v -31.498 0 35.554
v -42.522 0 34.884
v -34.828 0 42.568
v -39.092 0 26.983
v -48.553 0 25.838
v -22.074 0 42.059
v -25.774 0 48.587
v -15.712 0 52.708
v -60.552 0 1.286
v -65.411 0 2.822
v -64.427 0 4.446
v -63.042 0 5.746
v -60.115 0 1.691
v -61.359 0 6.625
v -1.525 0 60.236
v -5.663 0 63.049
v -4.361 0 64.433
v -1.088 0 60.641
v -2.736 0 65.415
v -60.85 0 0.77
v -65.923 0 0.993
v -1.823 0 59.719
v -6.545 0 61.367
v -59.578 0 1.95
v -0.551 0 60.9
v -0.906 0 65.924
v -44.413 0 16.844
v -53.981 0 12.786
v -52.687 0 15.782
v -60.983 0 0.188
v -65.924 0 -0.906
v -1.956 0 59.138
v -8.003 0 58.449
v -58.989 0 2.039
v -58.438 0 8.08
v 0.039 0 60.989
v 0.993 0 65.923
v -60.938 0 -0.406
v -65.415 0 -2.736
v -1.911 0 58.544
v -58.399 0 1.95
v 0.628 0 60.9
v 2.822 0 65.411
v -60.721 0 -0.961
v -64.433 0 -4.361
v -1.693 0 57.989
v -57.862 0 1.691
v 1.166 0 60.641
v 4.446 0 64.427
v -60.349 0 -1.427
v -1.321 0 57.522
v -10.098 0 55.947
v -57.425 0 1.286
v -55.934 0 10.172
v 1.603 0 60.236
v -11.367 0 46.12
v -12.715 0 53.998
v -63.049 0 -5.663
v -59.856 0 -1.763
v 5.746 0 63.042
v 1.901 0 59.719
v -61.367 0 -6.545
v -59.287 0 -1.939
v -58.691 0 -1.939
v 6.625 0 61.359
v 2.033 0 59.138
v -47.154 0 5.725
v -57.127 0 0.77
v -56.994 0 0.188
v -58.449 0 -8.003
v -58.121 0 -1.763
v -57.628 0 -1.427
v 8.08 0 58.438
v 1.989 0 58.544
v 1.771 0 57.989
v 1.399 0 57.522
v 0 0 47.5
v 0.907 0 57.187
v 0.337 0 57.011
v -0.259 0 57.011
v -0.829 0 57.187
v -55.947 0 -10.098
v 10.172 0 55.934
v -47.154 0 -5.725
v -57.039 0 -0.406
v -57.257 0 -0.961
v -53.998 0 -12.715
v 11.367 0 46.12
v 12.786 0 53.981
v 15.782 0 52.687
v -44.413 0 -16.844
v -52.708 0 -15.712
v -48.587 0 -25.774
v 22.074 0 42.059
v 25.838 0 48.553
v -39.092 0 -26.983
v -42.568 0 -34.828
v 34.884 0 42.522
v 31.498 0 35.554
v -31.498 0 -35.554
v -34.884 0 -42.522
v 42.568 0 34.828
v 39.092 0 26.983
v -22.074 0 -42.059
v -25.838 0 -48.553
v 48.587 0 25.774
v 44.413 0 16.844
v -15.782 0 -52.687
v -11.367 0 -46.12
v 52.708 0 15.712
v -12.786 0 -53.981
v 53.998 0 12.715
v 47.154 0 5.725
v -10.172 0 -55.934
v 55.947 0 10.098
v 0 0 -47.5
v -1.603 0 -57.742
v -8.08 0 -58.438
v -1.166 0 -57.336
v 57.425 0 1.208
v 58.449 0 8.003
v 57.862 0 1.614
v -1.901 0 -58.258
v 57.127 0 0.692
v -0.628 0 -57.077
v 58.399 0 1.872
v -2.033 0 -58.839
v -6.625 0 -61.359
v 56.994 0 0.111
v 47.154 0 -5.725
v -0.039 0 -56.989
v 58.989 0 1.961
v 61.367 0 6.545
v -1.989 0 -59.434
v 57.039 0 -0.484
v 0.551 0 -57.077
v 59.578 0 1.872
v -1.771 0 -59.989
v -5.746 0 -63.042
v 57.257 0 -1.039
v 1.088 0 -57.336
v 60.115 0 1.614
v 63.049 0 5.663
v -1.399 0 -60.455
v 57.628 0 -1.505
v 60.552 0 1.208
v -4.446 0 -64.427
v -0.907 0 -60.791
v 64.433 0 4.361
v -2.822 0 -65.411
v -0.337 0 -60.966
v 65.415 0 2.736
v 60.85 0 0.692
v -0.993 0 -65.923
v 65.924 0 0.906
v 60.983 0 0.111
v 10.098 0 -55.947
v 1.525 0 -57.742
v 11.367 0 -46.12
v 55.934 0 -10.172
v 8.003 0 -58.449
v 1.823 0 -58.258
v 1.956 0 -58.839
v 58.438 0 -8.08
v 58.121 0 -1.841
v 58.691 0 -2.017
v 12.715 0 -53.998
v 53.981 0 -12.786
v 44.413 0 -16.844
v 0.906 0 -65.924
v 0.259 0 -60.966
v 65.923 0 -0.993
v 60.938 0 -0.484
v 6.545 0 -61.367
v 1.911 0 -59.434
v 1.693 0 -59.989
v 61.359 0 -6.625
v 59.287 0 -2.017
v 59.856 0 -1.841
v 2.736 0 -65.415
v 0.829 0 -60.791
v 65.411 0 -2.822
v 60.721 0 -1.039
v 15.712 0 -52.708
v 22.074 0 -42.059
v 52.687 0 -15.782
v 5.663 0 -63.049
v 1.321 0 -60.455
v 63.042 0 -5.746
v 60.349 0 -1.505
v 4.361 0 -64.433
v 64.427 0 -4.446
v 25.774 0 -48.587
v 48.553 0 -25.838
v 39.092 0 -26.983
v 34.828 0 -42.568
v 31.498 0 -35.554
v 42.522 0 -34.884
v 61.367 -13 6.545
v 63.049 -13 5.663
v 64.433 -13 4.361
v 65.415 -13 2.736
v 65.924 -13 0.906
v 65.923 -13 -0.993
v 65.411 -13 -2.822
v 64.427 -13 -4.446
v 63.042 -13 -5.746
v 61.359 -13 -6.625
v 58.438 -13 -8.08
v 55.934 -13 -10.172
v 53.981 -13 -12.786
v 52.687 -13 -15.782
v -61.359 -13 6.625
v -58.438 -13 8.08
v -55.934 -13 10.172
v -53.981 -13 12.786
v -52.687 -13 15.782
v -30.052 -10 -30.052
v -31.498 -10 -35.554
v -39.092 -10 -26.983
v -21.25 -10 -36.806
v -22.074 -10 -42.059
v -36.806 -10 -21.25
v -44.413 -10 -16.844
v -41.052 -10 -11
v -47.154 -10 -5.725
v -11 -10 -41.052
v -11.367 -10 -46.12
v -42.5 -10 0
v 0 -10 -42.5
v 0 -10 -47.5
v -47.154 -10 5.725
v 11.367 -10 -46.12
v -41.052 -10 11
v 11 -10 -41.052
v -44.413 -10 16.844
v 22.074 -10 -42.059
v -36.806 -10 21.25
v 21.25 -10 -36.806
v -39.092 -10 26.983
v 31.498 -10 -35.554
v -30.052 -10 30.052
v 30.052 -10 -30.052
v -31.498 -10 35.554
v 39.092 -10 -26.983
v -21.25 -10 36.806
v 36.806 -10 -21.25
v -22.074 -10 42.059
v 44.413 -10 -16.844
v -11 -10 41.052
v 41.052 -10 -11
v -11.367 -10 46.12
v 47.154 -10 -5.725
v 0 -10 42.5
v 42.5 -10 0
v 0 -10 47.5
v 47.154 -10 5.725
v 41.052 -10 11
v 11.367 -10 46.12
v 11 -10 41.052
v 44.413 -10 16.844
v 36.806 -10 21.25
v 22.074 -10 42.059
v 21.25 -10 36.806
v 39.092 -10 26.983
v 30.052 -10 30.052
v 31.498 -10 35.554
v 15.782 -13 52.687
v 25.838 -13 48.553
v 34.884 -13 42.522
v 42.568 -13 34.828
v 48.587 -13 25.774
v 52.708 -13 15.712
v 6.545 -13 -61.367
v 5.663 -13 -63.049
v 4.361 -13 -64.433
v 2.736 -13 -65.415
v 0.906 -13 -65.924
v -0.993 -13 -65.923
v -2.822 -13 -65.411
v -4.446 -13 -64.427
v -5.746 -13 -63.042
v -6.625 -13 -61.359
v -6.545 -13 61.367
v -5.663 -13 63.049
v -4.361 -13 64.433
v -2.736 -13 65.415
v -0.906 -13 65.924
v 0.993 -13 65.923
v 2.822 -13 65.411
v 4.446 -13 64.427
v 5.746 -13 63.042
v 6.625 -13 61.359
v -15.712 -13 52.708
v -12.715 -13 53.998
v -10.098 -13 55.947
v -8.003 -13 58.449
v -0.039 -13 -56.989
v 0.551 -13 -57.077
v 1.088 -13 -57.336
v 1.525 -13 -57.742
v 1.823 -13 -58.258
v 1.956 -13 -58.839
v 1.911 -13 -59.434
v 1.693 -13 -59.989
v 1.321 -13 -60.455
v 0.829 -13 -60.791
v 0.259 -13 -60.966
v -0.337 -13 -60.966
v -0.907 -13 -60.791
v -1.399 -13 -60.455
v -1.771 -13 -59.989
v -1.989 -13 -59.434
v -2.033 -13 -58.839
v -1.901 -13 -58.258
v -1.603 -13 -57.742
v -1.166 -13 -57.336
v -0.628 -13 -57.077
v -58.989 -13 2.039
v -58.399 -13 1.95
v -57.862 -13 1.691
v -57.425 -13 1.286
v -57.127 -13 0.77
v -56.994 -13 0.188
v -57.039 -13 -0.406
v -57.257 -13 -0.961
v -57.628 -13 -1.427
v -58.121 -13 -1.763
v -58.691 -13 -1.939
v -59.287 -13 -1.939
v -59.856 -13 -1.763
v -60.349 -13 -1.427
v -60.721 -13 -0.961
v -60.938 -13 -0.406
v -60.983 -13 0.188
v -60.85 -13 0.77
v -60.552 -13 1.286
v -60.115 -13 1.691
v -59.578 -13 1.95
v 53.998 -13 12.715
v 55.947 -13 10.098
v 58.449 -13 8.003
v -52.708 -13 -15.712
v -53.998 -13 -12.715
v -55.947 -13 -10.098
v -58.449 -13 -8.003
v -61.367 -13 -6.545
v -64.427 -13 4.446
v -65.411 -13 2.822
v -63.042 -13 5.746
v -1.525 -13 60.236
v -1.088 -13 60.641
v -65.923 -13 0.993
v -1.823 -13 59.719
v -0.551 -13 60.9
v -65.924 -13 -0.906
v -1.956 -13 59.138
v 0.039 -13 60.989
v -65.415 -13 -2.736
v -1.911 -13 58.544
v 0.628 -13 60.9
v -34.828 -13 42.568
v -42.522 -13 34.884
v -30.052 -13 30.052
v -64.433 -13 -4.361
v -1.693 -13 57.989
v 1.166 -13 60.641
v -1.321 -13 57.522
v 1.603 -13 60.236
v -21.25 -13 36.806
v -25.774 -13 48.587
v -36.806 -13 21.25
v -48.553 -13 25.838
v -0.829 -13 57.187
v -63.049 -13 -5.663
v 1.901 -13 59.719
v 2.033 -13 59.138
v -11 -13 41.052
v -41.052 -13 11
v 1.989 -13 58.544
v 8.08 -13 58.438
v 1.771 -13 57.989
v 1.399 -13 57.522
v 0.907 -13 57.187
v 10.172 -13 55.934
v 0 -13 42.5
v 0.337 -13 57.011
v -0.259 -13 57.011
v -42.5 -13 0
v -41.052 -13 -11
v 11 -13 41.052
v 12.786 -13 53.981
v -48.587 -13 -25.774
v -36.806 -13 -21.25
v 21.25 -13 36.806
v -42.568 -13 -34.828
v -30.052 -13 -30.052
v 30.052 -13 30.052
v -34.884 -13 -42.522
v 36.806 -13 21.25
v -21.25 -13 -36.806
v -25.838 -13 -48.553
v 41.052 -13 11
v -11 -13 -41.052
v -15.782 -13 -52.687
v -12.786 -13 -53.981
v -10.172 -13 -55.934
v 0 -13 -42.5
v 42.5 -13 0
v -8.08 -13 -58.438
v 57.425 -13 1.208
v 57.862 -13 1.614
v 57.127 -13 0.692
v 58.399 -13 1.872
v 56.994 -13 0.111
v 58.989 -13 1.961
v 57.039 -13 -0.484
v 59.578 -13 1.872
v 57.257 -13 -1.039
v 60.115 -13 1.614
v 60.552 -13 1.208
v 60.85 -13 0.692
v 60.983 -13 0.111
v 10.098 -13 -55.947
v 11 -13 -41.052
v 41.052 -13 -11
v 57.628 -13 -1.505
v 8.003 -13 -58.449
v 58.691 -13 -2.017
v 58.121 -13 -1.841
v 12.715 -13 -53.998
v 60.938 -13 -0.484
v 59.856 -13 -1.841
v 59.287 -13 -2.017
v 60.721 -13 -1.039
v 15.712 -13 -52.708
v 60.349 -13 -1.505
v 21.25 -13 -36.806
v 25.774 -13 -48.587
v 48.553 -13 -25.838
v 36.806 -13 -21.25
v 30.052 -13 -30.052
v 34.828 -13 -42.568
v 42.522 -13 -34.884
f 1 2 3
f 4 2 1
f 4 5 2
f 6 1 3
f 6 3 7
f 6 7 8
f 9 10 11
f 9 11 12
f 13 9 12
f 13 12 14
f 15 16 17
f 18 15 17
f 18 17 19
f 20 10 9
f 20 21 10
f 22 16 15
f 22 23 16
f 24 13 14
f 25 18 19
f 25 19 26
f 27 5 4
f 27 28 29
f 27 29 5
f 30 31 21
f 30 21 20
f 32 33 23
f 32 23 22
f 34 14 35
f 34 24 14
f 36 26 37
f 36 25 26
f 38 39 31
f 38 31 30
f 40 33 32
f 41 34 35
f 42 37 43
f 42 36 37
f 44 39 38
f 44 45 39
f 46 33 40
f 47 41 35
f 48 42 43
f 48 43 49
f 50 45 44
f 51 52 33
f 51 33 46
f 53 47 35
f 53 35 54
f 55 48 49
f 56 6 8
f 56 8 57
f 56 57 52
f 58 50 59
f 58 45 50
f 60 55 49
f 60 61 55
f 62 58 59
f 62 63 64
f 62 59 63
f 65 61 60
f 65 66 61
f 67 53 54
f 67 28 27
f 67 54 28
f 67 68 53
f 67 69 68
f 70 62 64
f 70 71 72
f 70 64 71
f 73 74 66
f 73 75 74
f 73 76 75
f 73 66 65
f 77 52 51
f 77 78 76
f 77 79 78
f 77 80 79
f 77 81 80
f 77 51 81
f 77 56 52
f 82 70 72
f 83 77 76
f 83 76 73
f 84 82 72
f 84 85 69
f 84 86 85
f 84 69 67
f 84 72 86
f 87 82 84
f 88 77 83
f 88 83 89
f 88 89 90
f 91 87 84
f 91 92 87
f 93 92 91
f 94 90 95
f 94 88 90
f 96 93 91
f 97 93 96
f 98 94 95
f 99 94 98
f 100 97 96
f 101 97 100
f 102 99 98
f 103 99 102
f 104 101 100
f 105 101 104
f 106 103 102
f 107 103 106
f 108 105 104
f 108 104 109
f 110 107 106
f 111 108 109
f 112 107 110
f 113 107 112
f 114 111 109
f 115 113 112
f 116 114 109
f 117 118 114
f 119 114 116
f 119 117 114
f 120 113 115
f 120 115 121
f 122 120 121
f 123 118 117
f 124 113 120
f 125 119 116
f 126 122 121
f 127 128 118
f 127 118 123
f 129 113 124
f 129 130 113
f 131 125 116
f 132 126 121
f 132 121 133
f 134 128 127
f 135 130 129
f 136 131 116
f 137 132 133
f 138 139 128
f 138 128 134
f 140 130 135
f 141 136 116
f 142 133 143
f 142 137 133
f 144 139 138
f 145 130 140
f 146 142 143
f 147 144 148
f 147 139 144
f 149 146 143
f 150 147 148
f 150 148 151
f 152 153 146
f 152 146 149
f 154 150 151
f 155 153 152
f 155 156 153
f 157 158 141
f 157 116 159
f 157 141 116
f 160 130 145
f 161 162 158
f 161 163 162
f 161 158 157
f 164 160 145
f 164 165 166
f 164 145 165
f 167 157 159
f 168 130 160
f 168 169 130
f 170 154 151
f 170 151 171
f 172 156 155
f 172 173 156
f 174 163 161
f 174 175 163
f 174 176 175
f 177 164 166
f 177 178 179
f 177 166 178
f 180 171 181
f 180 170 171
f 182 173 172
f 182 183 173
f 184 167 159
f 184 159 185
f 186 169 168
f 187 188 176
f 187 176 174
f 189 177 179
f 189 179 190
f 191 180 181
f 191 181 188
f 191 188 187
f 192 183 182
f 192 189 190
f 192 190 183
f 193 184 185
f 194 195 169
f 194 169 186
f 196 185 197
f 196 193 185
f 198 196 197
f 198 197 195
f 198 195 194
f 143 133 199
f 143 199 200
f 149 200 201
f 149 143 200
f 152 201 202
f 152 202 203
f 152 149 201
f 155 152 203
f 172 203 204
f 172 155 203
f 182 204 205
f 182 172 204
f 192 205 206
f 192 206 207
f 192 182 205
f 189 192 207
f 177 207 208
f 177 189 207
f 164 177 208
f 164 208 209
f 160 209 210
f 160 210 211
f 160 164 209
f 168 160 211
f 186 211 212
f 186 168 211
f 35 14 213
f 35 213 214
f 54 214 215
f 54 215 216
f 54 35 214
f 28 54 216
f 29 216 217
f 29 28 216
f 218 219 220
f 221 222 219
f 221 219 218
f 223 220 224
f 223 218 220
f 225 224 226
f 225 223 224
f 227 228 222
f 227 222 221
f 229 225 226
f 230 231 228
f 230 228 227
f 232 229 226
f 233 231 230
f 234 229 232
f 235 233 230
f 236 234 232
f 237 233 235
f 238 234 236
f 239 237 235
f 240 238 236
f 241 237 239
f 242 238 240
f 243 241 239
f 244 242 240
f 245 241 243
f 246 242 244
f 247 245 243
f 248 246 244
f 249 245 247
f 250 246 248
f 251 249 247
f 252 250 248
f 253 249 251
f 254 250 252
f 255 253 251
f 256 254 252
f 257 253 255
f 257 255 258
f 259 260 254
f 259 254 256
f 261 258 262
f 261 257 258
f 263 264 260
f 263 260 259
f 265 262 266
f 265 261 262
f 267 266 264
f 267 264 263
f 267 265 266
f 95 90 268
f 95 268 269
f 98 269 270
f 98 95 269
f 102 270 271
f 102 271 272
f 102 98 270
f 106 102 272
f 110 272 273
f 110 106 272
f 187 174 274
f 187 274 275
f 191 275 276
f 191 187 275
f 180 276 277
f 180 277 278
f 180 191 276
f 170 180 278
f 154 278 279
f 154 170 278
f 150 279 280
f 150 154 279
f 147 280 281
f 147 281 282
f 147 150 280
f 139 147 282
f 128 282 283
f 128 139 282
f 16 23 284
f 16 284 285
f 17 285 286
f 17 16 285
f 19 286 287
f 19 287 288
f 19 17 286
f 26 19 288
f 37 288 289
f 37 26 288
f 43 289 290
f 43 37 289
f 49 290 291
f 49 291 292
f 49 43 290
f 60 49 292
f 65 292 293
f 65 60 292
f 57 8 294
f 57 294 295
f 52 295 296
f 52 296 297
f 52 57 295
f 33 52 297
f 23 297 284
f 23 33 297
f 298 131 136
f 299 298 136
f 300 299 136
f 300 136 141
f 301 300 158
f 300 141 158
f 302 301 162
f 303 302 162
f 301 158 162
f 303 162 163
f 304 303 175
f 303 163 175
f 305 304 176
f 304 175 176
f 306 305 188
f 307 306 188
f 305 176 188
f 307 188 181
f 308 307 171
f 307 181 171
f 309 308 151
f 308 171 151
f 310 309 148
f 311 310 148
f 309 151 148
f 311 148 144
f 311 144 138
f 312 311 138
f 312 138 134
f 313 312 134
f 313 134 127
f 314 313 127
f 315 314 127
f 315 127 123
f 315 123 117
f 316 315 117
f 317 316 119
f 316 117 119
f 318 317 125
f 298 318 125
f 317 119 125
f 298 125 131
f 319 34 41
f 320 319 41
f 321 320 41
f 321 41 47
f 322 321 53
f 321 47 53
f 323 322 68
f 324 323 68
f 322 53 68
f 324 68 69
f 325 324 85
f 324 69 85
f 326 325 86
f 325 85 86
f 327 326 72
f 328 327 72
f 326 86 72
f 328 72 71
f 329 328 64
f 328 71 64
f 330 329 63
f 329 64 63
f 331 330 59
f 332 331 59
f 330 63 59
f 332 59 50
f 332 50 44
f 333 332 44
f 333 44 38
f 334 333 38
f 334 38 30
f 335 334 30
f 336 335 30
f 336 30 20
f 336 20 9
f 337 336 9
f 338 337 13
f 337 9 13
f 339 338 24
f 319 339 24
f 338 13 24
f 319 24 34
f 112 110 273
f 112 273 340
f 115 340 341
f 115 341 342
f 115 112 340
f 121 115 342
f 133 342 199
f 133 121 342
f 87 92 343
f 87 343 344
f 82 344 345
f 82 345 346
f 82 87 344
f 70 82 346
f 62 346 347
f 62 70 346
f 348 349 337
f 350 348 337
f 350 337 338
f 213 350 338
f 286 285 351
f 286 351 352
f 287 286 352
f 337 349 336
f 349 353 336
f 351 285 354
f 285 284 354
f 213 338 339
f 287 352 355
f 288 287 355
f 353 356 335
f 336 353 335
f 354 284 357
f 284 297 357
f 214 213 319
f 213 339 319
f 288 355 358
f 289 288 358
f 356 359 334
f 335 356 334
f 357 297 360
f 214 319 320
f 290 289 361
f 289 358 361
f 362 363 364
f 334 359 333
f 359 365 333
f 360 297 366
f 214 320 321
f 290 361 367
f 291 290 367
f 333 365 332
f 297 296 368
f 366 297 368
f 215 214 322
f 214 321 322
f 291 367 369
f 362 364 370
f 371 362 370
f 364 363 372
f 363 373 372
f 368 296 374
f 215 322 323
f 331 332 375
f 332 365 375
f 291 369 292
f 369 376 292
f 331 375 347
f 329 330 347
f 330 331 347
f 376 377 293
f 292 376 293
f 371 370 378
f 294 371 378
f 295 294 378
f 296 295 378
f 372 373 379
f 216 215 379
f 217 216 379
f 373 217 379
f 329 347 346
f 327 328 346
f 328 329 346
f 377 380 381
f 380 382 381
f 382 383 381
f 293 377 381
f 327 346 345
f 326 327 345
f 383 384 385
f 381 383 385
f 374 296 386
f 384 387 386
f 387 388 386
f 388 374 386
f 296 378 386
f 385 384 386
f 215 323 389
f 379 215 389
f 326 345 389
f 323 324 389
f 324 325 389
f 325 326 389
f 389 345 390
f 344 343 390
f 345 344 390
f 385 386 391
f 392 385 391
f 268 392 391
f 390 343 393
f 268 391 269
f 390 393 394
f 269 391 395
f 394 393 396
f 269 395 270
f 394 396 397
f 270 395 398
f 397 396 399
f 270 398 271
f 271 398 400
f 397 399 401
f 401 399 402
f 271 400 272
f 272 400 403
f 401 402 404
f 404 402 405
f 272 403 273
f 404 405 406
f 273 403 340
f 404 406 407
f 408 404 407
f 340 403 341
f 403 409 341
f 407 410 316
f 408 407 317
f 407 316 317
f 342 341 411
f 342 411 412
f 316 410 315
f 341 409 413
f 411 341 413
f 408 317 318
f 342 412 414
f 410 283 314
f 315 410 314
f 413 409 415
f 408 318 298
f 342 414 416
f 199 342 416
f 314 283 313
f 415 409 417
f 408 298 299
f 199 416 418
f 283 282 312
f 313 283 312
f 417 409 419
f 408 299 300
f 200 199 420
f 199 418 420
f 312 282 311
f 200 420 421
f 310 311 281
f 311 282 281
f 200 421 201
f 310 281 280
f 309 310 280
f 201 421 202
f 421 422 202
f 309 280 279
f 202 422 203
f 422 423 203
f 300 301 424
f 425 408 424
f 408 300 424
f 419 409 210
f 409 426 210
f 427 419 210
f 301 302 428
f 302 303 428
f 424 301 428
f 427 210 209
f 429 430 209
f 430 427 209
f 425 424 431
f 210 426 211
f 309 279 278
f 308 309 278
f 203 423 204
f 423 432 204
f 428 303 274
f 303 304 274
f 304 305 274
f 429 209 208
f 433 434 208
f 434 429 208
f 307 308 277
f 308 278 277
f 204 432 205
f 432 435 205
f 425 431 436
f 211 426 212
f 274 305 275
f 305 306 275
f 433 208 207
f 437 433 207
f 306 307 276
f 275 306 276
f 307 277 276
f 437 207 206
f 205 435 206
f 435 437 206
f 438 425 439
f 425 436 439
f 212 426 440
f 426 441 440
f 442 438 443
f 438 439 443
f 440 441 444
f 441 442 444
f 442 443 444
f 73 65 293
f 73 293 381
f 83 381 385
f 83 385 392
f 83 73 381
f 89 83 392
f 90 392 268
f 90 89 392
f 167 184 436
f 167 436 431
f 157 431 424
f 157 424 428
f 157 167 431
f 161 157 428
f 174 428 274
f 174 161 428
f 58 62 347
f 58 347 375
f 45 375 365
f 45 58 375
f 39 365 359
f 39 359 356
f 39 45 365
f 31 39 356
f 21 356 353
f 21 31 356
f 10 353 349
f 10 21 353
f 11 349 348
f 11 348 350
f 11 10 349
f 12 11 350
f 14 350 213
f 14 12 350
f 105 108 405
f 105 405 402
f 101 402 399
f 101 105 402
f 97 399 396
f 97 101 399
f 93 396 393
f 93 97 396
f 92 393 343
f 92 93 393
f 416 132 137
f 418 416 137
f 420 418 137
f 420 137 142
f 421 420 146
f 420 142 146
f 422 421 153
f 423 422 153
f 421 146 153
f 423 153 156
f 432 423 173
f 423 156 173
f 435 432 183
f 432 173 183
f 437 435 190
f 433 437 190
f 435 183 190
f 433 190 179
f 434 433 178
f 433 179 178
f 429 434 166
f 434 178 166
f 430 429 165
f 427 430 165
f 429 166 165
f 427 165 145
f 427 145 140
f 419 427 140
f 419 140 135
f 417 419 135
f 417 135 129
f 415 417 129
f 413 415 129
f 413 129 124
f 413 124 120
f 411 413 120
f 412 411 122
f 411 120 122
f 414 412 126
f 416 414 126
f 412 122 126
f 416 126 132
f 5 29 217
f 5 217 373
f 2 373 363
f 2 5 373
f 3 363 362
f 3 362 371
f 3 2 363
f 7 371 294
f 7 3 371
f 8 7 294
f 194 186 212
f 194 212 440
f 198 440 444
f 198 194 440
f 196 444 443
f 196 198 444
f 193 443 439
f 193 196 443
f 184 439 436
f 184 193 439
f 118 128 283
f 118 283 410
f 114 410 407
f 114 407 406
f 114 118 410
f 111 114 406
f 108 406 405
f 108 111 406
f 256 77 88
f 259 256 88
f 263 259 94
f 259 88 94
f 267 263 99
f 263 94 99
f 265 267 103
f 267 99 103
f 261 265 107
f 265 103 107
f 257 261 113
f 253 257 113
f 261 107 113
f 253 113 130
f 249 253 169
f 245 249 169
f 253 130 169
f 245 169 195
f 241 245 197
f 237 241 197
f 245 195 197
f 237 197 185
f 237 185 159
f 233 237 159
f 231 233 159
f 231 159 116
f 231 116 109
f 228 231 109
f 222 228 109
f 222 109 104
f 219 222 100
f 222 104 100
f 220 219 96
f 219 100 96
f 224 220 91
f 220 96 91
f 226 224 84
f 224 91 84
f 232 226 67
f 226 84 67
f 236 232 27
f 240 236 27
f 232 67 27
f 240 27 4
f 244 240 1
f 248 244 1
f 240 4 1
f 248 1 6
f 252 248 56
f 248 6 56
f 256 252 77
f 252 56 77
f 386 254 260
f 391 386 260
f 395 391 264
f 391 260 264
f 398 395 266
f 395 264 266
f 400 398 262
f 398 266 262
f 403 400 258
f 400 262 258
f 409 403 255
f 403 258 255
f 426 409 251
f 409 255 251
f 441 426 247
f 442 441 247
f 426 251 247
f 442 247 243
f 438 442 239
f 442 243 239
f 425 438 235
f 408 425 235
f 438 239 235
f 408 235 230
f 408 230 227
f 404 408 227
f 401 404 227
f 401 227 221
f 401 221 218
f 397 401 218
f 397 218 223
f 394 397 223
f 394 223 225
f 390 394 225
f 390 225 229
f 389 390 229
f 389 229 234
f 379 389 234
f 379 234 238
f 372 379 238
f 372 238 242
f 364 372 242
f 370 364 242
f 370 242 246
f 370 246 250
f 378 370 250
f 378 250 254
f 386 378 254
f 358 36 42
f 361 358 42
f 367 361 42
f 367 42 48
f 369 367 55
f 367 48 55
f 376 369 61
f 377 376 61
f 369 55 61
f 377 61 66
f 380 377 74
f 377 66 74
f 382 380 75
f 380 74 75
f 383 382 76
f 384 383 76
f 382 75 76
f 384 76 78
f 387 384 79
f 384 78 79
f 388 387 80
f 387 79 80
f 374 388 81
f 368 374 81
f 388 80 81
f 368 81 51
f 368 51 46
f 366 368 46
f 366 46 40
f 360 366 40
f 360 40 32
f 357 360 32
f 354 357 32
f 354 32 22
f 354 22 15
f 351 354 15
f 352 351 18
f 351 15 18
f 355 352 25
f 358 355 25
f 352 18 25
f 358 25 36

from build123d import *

# Parameters (mm, degrees)
SKETCH1_R           = 2
BOSS_EXTRUDE1_DEPTH = 13
SKETCH2_R           = 47.5
CUT_EXTRUDE1_DEPTH  = 10
SKETCH3_R           = 42.5
CUT_EXTRUDE2_DEPTH  = 10


with BuildPart() as part:
    # Sketch1 → Boss-Extrude1 (new body)
    # profile 1 of 4: a face of its own
    with BuildSketch(Plane(origin=(0, 0, 0), x_dir=(1, 0, 0), z_dir=(0, 1, 0))):
        with BuildLine():
            ThreePointArc((61.367242208, -6.544599037), (65.988588721, 0.043478359), (61.35856476, 6.625460242))
            ThreePointArc((61.35856476, 6.625460242), (55.933608349, 10.171878458), (52.687221143, 15.781531238))
            ThreePointArc((52.687221143, 15.781531238), (-54.999988062, -0.036238224), (52.707971563, -15.712088776))
            ThreePointArc((52.707971563, -15.712088776), (55.946963812, -10.098162928), (61.367242208, -6.544599037))
        make_face()
        with Locations(Location((58.98859024, 0.038866222, 0), (0, 0, 270))):
            Circle(SKETCH1_R, mode=Mode.SUBTRACT)
    # profile 2 of 4: a face of its own
    with BuildSketch(Plane(origin=(0, 0, 0), x_dir=(1, 0, 0), z_dir=(0, 1, 0))):
        with BuildLine():
            ThreePointArc((6.625460242, -61.35856476), (10.171878458, -55.933608349), (15.781531238, -52.687221143))
            ThreePointArc((15.781531238, -52.687221143), (0.036238224, -54.999988062), (-15.712088776, -52.707971563))
            ThreePointArc((-15.712088776, -52.707971563), (-10.098162928, -55.946963812), (-6.544599037, -61.367242208))
            ThreePointArc((-6.544599037, -61.367242208), (0.043478359, -65.988588721), (6.625460242, -61.35856476))
        make_face()
        with Locations(Location((0.038866222, -58.98859024, 0), (0, 0, 270))):
            Circle(SKETCH1_R, mode=Mode.SUBTRACT)
    # profile 3 of 4: a face of its own
    with BuildSketch(Plane(origin=(0, 0, 0), x_dir=(1, 0, 0), z_dir=(0, 1, 0))):
        with BuildLine():
            ThreePointArc((-52.687221143, -15.781531238), (-54.999988062, -0.036238224), (-52.707971563, 15.712088776))
            ThreePointArc((-52.707971563, 15.712088776), (-55.946963812, 10.098162928), (-61.367242208, 6.544599037))
            ThreePointArc((-61.367242208, 6.544599037), (-65.988588721, -0.043478359), (-61.35856476, -6.625460242))
            ThreePointArc((-61.35856476, -6.625460242), (-55.933608349, -10.171878458), (-52.687221143, -15.781531238))
        make_face()
        with Locations(Location((-58.98859024, -0.038866222, 0), (0, 0, 270))):
            Circle(SKETCH1_R, mode=Mode.SUBTRACT)
    # profile 4 of 4: a face of its own
    with BuildSketch(Plane(origin=(0, 0, 0), x_dir=(1, 0, 0), z_dir=(0, 1, 0))):
        with BuildLine():
            ThreePointArc((-15.781531238, 52.687221143), (-0.036238224, 54.999988062), (15.712088776, 52.707971563))
            ThreePointArc((15.712088776, 52.707971563), (10.098162928, 55.946963812), (6.544599037, 61.367242208))
            ThreePointArc((6.544599037, 61.367242208), (-0.043478359, 65.988588721), (-6.625460242, 61.35856476))
            ThreePointArc((-6.625460242, 61.35856476), (-10.171878458, 55.933608349), (-15.781531238, 52.687221143))
        make_face()
        with Locations(Location((-0.038866222, 58.98859024, 0), (0, 0, 270))):
            Circle(SKETCH1_R, mode=Mode.SUBTRACT)
    extrude(amount=-BOSS_EXTRUDE1_DEPTH)

    # Sketch2 → Cut-Extrude1 (cut)
    with BuildSketch(Plane(origin=(0, 0, 0), x_dir=(1, 0, 0), z_dir=(0, 1, 0))):
        with Locations(Location((0, 0, 0), (0, 0, 270))):
            Circle(SKETCH2_R)
    extrude(amount=-CUT_EXTRUDE1_DEPTH, mode=Mode.SUBTRACT)

    # Sketch3 → Cut-Extrude2 (cut)
    with BuildSketch(Plane(origin=(0, -10, 0), x_dir=(1, 0, 0), z_dir=(0, 1, 0))):
        with Locations(Location((0, 0, 0), (0, 0, 270))):
            Circle(SKETCH3_R)
    extrude(amount=-CUT_EXTRUDE2_DEPTH, mode=Mode.SUBTRACT)


solid = part.part
